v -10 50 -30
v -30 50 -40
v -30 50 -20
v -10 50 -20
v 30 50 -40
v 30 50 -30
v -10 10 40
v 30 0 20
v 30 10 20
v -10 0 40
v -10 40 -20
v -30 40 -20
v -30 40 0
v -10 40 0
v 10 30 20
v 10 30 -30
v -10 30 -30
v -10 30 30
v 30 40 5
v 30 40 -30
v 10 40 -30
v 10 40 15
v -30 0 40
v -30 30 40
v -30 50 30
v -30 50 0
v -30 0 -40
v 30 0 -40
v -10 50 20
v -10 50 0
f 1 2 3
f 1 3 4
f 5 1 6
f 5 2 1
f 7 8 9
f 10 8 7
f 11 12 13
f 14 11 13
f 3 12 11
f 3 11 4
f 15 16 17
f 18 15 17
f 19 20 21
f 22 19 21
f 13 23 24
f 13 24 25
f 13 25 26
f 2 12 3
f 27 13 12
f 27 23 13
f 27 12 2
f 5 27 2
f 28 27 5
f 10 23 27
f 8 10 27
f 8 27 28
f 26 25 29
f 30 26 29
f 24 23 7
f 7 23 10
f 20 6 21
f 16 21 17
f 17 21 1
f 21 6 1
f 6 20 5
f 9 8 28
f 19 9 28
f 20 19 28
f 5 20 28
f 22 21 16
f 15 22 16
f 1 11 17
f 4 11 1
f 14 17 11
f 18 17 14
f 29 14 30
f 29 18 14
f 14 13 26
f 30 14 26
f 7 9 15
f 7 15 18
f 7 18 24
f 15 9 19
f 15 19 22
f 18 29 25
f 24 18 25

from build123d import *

# Parameters (mm, degrees)
SKETCH1_W           = 60
SKETCH1_H           = 80
BOSS_EXTRUDE1_DEPTH = 50
CUT_EXTRUDE1_DEPTH  = 70
SKETCH7_W           = 20
SKETCH7_H           = 10
CUT_EXTRUDE6_DEPTH  = 70
CUT_EXTRUDE7_DEPTH  = 70
CUT_EXTRUDE8_DEPTH  = 70


with BuildPart() as part:
    # Sketch1 → Boss-Extrude1 (new body)
    with BuildSketch(Plane(origin=(0, 0, 0), x_dir=(1, 0, 0), z_dir=(0, 1, 0))):
        Rectangle(SKETCH1_W, SKETCH1_H)
    extrude(amount=BOSS_EXTRUDE1_DEPTH)

    # Sketch2 → Cut-Extrude1 (cut)
    with BuildSketch(Plane.XY.offset(40)):
        Polygon((30, 40), (10, 40), (10, 30), (-10, 30), (-10, 50), (30, 50), align=None)
    extrude(amount=-CUT_EXTRUDE1_DEPTH, mode=Mode.SUBTRACT)

    # Sketch7 → Cut-Extrude6 (cut)
    with BuildSketch(Plane.ZY.offset(30)):
        with Locations((-10, 45)):
            Rectangle(SKETCH7_W, SKETCH7_H)
    extrude(amount=-CUT_EXTRUDE6_DEPTH, mode=Mode.SUBTRACT)

    # Sketch8 → Cut-Extrude7 (cut)
    with BuildSketch(Plane.XZ):
        Polygon((30, 40), (30, 20), (-10, 40), align=None)
    extrude(amount=-CUT_EXTRUDE7_DEPTH, mode=Mode.SUBTRACT)

    # 3DSketch6 → Cut-Extrude8 (cut, along a direction that is not the sketch's normal)
    with BuildSketch(Plane(origin=(-30, 50, 30), x_dir=(0.8241633836921342, -0.5494422557947563, -0.13736056394868917), z_dir=(0.408248290463863, 0.40824829046386274, 0.8164965809277263))):
        Polygon((0, 0), (17.856873313, 13.458531698), (27.47211279, -6.729265849), (45.328986103, 6.729265849), (40.521366365, 16.823164623), (58.378239678, 30.281696321), (72.801098893, 0), (37.087352266, -26.917063396), (9.615239476, -20.187797547), align=None)
    extrude(amount=CUT_EXTRUDE8_DEPTH, dir=(0, 0, 1), mode=Mode.SUBTRACT)


solid = part.part
